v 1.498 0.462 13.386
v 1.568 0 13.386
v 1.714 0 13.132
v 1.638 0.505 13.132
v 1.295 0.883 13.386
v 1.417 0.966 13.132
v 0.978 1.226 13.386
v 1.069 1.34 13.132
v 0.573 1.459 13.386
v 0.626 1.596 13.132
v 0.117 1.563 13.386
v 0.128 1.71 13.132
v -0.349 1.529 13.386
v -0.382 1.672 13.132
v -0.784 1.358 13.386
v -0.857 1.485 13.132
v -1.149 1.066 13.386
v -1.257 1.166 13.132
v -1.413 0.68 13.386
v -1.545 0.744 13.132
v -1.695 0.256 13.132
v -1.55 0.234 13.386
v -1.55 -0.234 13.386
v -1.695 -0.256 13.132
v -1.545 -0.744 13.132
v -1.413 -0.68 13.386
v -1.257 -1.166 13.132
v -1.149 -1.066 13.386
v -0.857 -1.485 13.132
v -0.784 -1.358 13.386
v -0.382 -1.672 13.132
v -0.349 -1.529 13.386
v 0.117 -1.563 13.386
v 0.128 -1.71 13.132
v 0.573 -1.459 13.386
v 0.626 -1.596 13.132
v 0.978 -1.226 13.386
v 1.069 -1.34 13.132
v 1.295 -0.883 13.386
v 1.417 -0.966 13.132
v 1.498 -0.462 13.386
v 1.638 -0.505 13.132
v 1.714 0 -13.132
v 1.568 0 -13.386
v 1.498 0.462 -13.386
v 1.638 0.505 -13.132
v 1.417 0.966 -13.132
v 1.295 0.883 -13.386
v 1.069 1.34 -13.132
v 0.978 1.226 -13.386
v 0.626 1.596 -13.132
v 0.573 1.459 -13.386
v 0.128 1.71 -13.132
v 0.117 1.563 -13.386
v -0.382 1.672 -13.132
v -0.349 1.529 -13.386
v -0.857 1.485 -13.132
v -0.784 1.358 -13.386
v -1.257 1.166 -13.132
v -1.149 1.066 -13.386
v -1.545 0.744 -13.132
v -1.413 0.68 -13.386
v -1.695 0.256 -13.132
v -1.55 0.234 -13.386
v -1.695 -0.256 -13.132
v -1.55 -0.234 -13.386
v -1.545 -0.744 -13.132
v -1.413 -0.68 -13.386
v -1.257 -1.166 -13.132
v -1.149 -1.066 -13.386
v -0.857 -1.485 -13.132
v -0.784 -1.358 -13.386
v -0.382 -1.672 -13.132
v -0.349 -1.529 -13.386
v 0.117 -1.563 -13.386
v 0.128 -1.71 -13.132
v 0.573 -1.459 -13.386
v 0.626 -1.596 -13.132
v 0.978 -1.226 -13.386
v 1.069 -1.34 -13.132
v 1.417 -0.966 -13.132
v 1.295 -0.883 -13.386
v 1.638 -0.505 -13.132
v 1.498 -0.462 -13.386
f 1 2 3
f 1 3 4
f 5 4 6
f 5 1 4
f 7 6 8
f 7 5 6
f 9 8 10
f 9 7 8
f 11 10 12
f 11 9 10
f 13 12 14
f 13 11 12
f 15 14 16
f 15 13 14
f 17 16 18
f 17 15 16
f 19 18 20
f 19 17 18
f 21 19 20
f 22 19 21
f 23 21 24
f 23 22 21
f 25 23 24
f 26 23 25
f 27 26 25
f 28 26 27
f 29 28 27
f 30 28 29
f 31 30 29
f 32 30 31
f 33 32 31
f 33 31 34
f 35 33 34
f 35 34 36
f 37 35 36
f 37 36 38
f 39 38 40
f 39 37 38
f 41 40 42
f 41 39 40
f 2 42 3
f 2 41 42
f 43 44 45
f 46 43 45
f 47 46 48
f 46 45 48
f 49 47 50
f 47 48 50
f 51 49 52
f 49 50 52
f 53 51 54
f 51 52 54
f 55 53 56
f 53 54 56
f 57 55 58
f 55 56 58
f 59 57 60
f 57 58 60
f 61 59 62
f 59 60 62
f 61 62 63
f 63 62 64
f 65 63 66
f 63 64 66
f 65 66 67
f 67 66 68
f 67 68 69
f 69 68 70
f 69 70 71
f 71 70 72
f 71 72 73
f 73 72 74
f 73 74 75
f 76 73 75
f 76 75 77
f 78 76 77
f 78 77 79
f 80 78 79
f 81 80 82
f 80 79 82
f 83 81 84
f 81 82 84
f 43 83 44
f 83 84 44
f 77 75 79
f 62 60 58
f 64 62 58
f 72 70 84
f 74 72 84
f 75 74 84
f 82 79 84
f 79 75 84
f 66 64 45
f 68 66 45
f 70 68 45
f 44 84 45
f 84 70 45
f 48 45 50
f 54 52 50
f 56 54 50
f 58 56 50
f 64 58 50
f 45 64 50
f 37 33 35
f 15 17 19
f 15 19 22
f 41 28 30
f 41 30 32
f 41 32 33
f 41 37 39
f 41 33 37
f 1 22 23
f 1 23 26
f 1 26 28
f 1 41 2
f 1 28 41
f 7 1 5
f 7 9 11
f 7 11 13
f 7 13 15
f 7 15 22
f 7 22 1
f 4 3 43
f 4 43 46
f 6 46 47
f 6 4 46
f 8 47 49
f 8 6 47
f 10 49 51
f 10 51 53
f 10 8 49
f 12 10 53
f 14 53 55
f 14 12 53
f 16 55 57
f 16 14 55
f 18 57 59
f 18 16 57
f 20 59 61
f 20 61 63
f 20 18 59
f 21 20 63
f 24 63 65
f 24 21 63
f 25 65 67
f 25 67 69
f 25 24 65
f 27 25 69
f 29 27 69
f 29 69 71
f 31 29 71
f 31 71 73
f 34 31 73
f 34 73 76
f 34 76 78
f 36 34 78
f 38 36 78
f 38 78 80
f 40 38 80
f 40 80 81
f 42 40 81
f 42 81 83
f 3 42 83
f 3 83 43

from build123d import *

# Parameters (mm, degrees)
SKETCH2_R      = 1.7145
EXTRUDE1_DEPTH = 13.3858
CHAMFER1_SIZE  = 0.254
CHAMFER1_SIZE2 = 0.146646968
CHAMFER2_SIZE  = 0.254
CHAMFER2_SIZE2 = 0.146646968


with BuildPart() as part:
    # Sketch2 → Extrude1 (new, symmetric)
    with BuildSketch(Plane.XY):
        Circle(SKETCH2_R)
    extrude(amount=EXTRUDE1_DEPTH, both=True)

    # Chamfer1
    chamfer1_edges = [part.edges().sort_by_distance(p)[0] for p in [
        (-1.7145, 0, 13.3858),
    ]]
    chamfer1_side = [part.faces().sort_by_distance(p)[0] for p in [
        (-1.7145, 0, 0),
    ]]
    chamfer(chamfer1_edges, length=CHAMFER1_SIZE, length2=CHAMFER1_SIZE2, reference=chamfer1_side[0])

    # Chamfer2
    chamfer2_edges = [part.edges().sort_by_distance(p)[0] for p in [
        (-1.7145, 0, -13.3858),
    ]]
    chamfer2_side = [part.faces().sort_by_distance(p)[0] for p in [
        (-1.7145, 0, -0.127),
    ]]
    chamfer(chamfer2_edges, length=CHAMFER2_SIZE, length2=CHAMFER2_SIZE2, reference=chamfer2_side[0])


solid = part.part
